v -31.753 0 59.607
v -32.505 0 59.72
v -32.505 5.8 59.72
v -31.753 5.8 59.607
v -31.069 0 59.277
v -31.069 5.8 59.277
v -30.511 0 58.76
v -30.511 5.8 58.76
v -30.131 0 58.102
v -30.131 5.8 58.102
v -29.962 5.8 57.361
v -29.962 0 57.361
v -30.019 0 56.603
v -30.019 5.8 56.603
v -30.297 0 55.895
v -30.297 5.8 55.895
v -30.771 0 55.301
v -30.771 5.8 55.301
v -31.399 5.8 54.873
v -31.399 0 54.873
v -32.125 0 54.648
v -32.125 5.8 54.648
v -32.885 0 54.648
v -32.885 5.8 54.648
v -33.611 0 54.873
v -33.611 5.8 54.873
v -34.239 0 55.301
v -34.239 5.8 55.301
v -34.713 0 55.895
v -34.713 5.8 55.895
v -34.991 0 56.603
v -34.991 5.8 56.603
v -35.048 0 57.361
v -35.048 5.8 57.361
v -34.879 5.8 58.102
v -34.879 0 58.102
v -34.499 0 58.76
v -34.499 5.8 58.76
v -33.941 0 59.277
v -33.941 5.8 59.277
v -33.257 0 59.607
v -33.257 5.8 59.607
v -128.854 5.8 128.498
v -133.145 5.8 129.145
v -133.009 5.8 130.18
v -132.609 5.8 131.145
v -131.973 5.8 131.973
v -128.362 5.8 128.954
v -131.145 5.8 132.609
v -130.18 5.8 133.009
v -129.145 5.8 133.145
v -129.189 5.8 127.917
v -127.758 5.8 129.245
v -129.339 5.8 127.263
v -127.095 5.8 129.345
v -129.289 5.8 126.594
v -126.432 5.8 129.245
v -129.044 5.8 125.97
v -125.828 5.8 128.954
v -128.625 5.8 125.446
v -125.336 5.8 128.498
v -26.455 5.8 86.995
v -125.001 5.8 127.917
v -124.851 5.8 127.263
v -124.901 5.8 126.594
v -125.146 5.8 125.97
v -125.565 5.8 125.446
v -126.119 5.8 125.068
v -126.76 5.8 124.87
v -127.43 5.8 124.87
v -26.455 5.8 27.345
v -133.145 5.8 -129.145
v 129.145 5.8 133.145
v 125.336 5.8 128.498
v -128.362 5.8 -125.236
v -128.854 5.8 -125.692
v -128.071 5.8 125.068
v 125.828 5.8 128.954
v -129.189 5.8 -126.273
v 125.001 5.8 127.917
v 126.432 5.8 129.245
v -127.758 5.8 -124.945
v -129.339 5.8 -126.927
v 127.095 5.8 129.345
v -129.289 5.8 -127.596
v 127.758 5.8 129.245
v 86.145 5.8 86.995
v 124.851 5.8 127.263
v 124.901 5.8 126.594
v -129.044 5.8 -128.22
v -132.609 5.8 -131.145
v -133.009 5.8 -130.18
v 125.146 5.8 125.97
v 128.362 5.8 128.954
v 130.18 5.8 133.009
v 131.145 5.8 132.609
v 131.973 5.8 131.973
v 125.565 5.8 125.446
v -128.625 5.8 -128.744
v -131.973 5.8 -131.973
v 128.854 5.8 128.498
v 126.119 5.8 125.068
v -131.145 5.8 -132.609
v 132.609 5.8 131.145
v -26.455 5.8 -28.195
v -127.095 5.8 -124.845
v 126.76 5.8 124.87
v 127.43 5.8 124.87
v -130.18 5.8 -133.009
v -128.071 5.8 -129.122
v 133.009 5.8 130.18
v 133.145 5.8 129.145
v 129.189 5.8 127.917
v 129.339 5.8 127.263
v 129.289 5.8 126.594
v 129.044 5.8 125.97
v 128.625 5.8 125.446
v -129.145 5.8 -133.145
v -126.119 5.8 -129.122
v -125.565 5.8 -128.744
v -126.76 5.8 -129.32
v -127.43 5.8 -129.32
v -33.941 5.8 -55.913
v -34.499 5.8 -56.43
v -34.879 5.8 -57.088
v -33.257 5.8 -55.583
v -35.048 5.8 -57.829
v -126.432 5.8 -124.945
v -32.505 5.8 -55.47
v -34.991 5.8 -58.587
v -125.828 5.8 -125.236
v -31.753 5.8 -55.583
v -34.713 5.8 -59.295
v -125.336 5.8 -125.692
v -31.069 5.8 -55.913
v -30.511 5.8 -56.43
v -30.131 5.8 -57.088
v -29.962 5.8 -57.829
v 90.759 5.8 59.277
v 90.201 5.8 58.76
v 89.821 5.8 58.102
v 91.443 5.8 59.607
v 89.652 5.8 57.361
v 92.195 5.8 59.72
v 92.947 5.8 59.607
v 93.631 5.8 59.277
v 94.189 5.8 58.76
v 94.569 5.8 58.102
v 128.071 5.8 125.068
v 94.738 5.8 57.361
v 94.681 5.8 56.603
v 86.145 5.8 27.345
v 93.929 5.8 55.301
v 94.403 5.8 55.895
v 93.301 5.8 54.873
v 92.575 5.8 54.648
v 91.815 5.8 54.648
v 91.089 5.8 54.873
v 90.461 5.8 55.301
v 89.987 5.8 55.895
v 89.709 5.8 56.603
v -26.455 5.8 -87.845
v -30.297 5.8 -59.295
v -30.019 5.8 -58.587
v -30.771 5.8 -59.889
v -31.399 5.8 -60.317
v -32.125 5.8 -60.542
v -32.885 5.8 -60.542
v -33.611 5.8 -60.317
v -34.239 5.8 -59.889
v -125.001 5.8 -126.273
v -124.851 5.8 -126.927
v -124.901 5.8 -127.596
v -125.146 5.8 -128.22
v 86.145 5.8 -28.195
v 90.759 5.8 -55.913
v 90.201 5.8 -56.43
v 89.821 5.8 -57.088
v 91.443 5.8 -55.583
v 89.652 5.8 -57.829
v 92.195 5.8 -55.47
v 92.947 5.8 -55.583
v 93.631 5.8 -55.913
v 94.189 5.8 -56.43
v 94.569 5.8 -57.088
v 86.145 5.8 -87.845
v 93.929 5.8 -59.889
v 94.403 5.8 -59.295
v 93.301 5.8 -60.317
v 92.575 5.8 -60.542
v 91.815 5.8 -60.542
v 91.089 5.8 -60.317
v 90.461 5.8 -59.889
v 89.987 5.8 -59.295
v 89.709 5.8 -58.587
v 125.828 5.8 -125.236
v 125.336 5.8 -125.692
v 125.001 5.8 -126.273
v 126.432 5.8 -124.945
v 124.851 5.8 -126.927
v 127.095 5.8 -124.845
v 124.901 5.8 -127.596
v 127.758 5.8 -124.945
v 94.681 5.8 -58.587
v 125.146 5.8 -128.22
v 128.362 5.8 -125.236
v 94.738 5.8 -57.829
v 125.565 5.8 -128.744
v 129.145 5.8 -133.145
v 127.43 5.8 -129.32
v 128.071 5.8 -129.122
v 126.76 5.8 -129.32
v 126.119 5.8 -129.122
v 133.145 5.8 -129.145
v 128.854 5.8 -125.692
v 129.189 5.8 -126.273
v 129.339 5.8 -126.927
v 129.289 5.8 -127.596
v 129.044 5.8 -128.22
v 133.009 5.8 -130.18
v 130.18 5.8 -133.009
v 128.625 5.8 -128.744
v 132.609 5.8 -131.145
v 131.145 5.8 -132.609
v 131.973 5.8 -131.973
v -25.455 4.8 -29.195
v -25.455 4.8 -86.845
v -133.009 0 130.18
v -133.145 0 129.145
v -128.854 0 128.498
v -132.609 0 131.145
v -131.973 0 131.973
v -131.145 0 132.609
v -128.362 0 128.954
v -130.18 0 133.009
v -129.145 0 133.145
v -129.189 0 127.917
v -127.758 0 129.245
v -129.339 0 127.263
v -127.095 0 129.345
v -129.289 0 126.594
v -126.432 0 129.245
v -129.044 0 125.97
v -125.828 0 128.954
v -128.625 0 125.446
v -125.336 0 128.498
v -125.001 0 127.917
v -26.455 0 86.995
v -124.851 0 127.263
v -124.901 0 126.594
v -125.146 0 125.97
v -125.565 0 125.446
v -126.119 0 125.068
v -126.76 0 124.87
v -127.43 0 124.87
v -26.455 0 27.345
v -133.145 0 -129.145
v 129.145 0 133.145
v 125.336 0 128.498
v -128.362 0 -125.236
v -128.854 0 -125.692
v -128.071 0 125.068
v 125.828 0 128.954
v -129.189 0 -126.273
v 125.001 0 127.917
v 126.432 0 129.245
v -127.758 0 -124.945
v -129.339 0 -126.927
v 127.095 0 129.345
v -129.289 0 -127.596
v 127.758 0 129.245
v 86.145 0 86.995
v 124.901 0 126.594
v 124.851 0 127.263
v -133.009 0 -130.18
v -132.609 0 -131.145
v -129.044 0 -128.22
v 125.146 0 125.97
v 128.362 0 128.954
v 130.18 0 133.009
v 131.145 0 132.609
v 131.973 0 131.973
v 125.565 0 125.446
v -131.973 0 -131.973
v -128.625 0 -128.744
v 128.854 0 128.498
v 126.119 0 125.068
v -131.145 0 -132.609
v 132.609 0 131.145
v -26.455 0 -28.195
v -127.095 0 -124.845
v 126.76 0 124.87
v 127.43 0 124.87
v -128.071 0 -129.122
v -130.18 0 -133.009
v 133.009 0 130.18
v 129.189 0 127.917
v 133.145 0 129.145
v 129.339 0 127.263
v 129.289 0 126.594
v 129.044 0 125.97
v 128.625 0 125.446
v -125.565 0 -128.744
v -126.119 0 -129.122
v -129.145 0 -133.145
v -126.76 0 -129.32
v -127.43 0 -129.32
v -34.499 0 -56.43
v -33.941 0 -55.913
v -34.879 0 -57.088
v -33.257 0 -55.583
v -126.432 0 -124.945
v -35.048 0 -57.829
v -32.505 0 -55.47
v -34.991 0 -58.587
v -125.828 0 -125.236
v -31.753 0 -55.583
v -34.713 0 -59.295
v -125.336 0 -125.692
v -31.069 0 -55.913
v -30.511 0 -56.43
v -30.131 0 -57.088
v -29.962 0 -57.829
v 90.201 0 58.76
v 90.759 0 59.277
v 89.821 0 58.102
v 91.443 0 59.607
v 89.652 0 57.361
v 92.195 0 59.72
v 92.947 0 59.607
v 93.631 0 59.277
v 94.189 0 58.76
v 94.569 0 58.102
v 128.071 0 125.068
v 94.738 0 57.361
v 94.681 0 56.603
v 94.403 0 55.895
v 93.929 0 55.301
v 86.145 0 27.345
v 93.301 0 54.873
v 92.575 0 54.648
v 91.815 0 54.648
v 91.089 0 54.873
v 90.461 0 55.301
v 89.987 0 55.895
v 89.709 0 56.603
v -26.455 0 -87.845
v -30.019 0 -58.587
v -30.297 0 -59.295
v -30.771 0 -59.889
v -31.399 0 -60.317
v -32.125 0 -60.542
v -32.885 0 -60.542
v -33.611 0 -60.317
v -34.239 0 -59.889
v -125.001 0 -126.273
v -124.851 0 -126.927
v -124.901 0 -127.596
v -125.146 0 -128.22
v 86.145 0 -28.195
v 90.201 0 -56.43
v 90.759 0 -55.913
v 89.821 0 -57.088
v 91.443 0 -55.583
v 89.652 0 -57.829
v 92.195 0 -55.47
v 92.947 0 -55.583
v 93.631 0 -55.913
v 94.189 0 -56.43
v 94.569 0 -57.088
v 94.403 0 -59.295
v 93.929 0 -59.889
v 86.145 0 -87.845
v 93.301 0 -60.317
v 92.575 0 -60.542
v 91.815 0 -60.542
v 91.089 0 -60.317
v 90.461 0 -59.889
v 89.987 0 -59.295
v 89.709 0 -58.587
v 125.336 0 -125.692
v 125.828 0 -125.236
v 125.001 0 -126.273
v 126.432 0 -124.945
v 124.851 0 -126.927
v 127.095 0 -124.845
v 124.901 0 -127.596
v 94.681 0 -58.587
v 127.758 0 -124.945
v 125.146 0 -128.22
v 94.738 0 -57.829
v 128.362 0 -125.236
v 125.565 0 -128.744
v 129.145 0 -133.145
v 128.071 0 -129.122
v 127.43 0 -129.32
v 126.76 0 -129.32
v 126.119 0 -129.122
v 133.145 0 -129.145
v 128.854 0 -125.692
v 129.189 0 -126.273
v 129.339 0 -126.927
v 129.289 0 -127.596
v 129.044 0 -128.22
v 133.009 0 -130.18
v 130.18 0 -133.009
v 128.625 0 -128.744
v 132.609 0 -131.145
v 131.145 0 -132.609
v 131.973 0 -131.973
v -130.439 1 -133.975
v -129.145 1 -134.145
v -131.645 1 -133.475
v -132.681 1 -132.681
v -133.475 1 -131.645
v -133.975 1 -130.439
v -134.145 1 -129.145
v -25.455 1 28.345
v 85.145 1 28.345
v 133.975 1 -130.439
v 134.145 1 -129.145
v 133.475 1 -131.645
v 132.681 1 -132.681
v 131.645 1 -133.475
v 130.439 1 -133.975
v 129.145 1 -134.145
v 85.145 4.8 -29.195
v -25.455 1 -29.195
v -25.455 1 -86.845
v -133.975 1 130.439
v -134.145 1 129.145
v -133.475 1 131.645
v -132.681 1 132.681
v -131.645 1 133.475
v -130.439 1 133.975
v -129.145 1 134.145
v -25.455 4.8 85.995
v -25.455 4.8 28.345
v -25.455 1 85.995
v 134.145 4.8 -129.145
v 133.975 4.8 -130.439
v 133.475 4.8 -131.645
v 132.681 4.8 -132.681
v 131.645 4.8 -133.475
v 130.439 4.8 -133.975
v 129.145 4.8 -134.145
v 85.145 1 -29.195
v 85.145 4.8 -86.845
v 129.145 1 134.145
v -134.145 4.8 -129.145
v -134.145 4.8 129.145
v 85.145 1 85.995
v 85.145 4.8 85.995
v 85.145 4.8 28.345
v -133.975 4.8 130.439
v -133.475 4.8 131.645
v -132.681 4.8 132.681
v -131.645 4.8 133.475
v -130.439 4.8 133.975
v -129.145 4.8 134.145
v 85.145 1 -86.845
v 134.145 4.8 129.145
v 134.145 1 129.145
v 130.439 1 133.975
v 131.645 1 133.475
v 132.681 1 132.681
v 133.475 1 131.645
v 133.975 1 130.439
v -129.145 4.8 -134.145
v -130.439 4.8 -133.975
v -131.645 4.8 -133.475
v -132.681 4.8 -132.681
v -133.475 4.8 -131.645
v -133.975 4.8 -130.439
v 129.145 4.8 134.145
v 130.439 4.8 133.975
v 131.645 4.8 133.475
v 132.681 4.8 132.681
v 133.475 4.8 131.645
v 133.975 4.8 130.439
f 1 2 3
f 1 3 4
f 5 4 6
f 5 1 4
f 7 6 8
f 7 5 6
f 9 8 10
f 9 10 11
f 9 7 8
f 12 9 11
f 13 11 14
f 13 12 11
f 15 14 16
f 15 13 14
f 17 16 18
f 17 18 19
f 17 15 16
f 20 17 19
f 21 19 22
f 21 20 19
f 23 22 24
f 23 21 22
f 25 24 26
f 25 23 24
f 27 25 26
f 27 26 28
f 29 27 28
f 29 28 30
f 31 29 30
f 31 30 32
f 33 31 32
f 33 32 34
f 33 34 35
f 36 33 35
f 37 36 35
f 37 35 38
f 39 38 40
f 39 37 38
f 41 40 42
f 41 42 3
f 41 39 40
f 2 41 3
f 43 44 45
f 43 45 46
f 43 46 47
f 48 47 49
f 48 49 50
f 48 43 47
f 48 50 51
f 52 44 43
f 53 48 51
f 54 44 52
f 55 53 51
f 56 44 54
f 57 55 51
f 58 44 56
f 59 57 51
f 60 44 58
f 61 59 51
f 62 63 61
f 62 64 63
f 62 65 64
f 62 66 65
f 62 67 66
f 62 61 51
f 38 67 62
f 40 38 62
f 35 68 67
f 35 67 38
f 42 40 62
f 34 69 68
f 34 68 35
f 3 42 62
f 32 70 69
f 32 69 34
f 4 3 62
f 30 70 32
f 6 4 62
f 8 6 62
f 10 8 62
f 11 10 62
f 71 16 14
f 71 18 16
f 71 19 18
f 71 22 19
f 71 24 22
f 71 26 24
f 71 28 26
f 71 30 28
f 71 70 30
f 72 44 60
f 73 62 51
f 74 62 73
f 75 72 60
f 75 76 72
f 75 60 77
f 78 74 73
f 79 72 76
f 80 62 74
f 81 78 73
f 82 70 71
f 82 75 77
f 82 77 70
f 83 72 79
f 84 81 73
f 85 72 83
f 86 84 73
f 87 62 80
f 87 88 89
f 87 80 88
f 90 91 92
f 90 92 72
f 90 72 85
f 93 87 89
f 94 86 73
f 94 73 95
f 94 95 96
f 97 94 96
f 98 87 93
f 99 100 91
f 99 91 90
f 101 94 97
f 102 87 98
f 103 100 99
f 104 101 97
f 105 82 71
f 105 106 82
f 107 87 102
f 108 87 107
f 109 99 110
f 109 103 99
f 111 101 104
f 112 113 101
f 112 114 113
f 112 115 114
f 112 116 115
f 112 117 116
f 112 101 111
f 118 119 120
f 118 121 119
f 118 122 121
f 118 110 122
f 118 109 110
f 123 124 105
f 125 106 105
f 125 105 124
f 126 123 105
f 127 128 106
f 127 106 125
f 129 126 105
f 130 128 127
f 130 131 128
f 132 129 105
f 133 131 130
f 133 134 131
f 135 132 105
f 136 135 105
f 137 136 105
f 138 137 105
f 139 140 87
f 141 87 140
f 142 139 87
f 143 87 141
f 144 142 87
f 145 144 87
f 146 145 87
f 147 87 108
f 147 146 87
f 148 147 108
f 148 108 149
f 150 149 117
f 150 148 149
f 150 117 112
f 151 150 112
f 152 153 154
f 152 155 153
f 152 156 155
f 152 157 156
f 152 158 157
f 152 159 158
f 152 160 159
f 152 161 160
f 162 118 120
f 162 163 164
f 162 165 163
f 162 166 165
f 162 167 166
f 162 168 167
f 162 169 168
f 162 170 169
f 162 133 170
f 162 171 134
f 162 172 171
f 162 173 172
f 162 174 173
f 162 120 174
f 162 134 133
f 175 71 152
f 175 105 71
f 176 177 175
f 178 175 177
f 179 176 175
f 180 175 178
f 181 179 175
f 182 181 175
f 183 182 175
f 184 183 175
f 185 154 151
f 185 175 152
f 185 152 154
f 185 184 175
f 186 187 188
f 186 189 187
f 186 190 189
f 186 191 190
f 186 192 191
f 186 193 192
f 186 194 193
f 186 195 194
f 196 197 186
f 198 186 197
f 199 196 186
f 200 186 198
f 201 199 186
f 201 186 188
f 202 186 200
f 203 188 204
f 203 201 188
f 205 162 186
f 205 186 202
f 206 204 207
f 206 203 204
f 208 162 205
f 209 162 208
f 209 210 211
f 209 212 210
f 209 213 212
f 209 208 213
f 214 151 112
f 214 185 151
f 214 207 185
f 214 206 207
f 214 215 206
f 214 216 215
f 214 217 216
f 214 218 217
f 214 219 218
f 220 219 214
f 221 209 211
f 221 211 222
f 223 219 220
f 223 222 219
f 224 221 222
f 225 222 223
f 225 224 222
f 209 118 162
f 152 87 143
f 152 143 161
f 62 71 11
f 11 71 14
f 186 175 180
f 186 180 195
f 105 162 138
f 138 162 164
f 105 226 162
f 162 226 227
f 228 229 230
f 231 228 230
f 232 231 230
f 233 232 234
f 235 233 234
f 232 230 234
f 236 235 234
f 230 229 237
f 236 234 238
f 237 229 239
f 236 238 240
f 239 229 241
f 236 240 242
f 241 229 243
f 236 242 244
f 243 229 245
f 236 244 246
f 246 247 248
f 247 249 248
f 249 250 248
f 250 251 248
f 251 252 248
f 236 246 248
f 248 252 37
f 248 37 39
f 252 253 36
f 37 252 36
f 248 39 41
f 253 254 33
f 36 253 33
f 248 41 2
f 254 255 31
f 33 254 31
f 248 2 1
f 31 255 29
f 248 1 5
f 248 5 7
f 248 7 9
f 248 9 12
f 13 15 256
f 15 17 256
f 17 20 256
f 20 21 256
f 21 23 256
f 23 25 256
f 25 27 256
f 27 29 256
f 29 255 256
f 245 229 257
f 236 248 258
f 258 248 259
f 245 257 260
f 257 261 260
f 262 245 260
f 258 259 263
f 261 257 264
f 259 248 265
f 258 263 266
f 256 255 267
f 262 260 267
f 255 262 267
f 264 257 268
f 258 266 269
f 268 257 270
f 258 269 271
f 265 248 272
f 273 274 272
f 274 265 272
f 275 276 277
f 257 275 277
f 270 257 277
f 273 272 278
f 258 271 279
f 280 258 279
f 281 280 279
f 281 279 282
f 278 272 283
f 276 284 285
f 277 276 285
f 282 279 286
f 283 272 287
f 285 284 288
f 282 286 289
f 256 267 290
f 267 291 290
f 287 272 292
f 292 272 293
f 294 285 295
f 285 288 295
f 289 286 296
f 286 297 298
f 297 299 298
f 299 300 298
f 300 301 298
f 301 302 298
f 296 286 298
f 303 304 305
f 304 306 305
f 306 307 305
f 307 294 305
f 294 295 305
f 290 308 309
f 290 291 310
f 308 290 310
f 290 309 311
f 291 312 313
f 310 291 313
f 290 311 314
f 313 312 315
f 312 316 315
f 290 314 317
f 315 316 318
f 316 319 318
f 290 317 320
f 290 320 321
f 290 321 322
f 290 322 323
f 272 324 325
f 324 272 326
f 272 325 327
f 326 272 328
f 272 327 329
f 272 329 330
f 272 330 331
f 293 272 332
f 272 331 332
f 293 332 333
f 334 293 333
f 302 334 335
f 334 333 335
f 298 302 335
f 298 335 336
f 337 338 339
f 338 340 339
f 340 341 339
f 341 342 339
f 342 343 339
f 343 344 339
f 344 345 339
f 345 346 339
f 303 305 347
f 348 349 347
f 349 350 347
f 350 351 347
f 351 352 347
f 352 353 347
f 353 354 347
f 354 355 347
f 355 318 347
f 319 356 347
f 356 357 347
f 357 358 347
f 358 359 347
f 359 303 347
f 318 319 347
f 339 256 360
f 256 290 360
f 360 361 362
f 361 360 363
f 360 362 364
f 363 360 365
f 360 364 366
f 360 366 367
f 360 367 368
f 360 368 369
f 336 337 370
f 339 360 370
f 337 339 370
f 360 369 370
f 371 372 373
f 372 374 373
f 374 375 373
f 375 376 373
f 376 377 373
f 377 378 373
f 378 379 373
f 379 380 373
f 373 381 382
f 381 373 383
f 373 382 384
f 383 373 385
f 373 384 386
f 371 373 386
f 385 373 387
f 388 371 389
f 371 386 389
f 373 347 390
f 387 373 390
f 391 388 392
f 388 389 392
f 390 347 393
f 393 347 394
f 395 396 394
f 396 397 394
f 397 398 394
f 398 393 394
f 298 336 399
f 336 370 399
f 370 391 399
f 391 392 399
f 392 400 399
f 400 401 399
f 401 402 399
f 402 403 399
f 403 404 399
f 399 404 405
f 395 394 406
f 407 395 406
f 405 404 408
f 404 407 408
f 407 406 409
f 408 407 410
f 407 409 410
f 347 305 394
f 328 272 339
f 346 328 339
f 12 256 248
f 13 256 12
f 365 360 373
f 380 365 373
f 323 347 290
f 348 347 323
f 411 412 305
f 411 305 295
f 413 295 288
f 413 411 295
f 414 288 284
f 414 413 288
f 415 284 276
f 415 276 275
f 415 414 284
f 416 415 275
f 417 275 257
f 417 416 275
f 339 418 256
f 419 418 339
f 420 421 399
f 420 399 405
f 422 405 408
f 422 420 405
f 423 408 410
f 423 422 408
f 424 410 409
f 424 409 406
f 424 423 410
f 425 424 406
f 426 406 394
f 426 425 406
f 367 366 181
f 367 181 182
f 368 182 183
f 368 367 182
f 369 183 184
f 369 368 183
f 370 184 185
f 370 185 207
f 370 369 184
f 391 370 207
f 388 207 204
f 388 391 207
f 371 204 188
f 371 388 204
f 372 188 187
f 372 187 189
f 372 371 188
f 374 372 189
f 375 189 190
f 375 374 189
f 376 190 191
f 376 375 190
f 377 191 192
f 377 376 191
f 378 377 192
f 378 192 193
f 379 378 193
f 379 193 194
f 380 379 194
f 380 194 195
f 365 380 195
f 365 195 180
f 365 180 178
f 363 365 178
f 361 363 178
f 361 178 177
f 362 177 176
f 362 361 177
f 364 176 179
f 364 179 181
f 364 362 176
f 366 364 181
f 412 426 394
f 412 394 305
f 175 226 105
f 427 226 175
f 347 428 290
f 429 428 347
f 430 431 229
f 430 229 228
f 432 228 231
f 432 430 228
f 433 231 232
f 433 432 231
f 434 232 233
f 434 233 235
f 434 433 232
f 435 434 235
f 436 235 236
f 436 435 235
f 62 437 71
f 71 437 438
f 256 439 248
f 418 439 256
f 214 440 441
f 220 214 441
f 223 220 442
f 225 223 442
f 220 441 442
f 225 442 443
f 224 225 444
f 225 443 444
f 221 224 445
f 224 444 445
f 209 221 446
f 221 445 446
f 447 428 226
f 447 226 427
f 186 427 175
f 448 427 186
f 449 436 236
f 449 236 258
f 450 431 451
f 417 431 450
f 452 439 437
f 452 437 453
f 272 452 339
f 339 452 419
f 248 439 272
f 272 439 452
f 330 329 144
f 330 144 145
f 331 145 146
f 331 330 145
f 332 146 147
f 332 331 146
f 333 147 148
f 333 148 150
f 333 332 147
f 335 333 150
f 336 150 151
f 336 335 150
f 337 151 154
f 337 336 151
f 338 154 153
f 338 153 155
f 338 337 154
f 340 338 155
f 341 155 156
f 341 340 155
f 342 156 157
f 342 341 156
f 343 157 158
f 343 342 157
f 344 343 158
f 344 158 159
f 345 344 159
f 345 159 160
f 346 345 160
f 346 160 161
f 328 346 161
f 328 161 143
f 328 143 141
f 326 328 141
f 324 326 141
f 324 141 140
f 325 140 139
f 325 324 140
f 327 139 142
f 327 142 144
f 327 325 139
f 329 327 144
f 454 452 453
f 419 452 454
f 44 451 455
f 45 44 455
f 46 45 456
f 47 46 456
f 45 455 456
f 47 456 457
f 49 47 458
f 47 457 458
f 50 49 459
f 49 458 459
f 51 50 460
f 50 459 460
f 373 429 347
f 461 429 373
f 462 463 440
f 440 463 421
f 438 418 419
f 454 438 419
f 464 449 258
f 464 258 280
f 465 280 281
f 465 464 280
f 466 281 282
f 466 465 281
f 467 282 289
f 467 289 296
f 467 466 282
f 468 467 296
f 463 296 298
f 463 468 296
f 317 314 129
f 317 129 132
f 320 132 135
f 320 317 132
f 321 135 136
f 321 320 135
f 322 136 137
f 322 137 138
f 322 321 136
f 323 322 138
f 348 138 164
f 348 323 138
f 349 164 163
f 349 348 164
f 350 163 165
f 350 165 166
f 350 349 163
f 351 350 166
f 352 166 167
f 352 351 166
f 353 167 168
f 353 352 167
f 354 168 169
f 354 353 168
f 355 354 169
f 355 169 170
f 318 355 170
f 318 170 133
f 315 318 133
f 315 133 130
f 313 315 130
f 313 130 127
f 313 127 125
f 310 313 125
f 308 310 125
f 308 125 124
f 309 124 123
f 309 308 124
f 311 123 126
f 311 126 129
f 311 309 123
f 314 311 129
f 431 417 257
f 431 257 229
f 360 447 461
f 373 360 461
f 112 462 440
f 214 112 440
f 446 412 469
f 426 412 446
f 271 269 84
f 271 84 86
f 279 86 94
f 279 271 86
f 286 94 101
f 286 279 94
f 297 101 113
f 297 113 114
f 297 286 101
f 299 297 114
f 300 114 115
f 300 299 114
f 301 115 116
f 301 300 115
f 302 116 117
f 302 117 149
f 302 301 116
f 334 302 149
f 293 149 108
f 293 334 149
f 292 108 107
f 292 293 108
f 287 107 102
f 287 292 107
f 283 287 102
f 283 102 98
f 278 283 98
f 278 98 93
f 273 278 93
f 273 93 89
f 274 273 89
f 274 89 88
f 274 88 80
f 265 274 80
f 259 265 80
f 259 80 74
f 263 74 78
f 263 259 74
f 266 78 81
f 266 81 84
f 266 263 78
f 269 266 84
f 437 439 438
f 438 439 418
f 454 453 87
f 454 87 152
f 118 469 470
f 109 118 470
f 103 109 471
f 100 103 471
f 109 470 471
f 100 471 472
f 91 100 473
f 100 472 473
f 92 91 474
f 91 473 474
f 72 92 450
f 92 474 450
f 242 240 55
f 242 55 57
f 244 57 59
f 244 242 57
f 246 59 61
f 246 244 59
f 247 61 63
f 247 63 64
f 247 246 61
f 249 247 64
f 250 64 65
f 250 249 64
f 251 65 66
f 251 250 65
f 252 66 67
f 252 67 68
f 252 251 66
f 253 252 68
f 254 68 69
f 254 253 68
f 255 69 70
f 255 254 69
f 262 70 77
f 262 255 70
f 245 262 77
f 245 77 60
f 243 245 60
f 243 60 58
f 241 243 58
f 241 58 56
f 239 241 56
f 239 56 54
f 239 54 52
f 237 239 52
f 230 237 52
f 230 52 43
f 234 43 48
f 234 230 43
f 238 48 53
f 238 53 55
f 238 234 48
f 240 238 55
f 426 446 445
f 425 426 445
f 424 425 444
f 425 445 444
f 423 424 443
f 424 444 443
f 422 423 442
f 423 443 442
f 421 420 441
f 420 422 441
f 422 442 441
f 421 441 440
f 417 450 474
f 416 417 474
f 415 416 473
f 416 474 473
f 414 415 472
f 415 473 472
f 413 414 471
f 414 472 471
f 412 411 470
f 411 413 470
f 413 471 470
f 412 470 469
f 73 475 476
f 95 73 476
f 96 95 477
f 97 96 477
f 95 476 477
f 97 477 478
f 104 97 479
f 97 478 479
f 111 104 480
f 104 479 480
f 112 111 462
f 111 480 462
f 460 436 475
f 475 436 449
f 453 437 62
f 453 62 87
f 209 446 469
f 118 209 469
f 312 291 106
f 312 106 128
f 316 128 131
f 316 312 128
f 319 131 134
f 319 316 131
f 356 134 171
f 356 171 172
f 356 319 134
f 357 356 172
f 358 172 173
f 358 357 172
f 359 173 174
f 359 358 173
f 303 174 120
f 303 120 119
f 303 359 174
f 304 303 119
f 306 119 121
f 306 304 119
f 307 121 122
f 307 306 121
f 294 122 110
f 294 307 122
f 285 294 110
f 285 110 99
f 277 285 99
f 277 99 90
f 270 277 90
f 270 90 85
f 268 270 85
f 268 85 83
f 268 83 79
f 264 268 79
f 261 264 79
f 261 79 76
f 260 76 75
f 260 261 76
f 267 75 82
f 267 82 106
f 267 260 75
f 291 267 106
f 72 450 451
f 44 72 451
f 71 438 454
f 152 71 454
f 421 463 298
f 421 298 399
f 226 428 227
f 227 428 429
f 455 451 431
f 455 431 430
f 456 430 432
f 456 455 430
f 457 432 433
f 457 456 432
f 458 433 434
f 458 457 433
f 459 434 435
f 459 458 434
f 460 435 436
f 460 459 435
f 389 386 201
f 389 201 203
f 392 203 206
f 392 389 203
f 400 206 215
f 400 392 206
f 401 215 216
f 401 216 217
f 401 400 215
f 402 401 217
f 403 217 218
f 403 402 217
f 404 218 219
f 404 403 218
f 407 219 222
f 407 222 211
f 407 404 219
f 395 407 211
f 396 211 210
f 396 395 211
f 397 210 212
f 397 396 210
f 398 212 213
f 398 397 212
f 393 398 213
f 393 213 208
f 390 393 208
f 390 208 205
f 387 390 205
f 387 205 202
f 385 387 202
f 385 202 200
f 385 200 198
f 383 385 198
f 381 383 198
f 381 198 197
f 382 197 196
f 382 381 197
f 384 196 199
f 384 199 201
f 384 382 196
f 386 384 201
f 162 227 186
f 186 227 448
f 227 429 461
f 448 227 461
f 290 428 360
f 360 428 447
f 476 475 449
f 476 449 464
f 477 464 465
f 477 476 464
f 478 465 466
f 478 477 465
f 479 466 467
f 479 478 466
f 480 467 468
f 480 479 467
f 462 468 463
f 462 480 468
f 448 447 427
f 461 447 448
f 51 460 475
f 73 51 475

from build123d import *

# Parameters (mm, degrees)
SKETCH1_W           = 268.29
SKETCH1_H           = 268.29
SKETCH1_R           = 2.25
SKETCH1_R_2         = 2.55
SKETCH1_W_2         = 110.6
SKETCH1_H_2         = 57.65
BOSS_EXTRUDE1_DEPTH = 5.8
FILLET1_R           = 5
CHAMFER1_SIZE       = 1


with BuildPart() as part:
    # Sketch1 → Boss-Extrude1 (new body)
    with BuildSketch(Plane(origin=(0, 0, 0), x_dir=(1, 0, 0), z_dir=(0, 1, 0))):
        Rectangle(SKETCH1_W, SKETCH1_H)
        with Locations(Location((-127.095, 127.095, 0), (0, 0, 270))):
            Circle(SKETCH1_R, mode=Mode.SUBTRACT)
        with Locations(Location((127.095, 127.095, 0), (0, 0, 270))):
            Circle(SKETCH1_R, mode=Mode.SUBTRACT)
        with Locations(Location((127.095, -127.095, 0), (0, 0, 270))):
            Circle(SKETCH1_R, mode=Mode.SUBTRACT)
        with Locations(Location((-127.095, -127.095, 0), (0, 0, 270))):
            Circle(SKETCH1_R, mode=Mode.SUBTRACT)
        with Locations(Location((-32.505, 58.02, 0), (0, 0, 270))):
            Circle(SKETCH1_R_2, mode=Mode.SUBTRACT)
        with Locations(Location((-32.505, -57.17, 0), (0, 0, 270))):
            Circle(SKETCH1_R_2, mode=Mode.SUBTRACT)
        with Locations(Location((92.195, -57.17, 0), (0, 0, 270))):
            Circle(SKETCH1_R_2, mode=Mode.SUBTRACT)
        with Locations(Location((92.195, 58.02, 0), (0, 0, 270))):
            Circle(SKETCH1_R_2, mode=Mode.SUBTRACT)
        with Locations((29.845, 58.02)):
            Rectangle(SKETCH1_W_2, SKETCH1_H_2, mode=Mode.SUBTRACT)
        with Locations((29.845, -57.17)):
            Rectangle(SKETCH1_W_2, SKETCH1_H_2, mode=Mode.SUBTRACT)
    extrude(amount=BOSS_EXTRUDE1_DEPTH)

    # Fillet1
    fillet1_edges = [part.edges().sort_by_distance(p)[0] for p in [
        (134.145, 2.9, 134.145),
        (-134.145, 2.9, 134.145),
        (-134.145, 2.9, -134.145),
        (134.145, 2.9, -134.145),
    ]]
    fillet(fillet1_edges, radius=FILLET1_R)

    # Chamfer1
    chamfer1_edges = [part.edges().sort_by_distance(p)[0] for p in [
        (85.145, 0, 57.17),
        (29.845, 0, 28.345),
        (-25.455, 0, 57.17),
        (29.845, 0, 85.995),
        (85.145, 5.8, 57.17),
        (29.845, 5.8, 28.345),
        (-25.455, 5.8, 57.17),
        (29.845, 5.8, 85.995),
        (85.145, 0, -58.02),
        (29.845, 0, -86.845),
        (-25.455, 0, -58.02),
        (29.845, 0, -29.195),
        (85.145, 5.8, -58.02),
        (29.845, 5.8, -86.845),
        (-25.455, 5.8, -58.02),
        (29.845, 5.8, -29.195),
        (134.145, 0, 0),
        (134.145, 5.8, 0),
        (0, 0, 134.145),
        (-134.145, 0, 0),
        (0, 0, -134.145),
        (-132.680533906, 0, 132.680533906),
        (-132.680533906, 0, -132.680533906),
        (132.680533906, 0, -132.680533906),
        (132.680533906, 0, 132.680533906),
        (0, 5.8, 134.145),
        (0, 5.8, -134.145),
        (-134.145, 5.8, 0),
        (-132.680533906, 5.8, 132.680533906),
        (-132.680533906, 5.8, -132.680533906),
        (132.680533906, 5.8, -132.680533906),
        (132.680533906, 5.8, 132.680533906),
    ]]
    chamfer(chamfer1_edges, length=CHAMFER1_SIZE)


solid = part.part
